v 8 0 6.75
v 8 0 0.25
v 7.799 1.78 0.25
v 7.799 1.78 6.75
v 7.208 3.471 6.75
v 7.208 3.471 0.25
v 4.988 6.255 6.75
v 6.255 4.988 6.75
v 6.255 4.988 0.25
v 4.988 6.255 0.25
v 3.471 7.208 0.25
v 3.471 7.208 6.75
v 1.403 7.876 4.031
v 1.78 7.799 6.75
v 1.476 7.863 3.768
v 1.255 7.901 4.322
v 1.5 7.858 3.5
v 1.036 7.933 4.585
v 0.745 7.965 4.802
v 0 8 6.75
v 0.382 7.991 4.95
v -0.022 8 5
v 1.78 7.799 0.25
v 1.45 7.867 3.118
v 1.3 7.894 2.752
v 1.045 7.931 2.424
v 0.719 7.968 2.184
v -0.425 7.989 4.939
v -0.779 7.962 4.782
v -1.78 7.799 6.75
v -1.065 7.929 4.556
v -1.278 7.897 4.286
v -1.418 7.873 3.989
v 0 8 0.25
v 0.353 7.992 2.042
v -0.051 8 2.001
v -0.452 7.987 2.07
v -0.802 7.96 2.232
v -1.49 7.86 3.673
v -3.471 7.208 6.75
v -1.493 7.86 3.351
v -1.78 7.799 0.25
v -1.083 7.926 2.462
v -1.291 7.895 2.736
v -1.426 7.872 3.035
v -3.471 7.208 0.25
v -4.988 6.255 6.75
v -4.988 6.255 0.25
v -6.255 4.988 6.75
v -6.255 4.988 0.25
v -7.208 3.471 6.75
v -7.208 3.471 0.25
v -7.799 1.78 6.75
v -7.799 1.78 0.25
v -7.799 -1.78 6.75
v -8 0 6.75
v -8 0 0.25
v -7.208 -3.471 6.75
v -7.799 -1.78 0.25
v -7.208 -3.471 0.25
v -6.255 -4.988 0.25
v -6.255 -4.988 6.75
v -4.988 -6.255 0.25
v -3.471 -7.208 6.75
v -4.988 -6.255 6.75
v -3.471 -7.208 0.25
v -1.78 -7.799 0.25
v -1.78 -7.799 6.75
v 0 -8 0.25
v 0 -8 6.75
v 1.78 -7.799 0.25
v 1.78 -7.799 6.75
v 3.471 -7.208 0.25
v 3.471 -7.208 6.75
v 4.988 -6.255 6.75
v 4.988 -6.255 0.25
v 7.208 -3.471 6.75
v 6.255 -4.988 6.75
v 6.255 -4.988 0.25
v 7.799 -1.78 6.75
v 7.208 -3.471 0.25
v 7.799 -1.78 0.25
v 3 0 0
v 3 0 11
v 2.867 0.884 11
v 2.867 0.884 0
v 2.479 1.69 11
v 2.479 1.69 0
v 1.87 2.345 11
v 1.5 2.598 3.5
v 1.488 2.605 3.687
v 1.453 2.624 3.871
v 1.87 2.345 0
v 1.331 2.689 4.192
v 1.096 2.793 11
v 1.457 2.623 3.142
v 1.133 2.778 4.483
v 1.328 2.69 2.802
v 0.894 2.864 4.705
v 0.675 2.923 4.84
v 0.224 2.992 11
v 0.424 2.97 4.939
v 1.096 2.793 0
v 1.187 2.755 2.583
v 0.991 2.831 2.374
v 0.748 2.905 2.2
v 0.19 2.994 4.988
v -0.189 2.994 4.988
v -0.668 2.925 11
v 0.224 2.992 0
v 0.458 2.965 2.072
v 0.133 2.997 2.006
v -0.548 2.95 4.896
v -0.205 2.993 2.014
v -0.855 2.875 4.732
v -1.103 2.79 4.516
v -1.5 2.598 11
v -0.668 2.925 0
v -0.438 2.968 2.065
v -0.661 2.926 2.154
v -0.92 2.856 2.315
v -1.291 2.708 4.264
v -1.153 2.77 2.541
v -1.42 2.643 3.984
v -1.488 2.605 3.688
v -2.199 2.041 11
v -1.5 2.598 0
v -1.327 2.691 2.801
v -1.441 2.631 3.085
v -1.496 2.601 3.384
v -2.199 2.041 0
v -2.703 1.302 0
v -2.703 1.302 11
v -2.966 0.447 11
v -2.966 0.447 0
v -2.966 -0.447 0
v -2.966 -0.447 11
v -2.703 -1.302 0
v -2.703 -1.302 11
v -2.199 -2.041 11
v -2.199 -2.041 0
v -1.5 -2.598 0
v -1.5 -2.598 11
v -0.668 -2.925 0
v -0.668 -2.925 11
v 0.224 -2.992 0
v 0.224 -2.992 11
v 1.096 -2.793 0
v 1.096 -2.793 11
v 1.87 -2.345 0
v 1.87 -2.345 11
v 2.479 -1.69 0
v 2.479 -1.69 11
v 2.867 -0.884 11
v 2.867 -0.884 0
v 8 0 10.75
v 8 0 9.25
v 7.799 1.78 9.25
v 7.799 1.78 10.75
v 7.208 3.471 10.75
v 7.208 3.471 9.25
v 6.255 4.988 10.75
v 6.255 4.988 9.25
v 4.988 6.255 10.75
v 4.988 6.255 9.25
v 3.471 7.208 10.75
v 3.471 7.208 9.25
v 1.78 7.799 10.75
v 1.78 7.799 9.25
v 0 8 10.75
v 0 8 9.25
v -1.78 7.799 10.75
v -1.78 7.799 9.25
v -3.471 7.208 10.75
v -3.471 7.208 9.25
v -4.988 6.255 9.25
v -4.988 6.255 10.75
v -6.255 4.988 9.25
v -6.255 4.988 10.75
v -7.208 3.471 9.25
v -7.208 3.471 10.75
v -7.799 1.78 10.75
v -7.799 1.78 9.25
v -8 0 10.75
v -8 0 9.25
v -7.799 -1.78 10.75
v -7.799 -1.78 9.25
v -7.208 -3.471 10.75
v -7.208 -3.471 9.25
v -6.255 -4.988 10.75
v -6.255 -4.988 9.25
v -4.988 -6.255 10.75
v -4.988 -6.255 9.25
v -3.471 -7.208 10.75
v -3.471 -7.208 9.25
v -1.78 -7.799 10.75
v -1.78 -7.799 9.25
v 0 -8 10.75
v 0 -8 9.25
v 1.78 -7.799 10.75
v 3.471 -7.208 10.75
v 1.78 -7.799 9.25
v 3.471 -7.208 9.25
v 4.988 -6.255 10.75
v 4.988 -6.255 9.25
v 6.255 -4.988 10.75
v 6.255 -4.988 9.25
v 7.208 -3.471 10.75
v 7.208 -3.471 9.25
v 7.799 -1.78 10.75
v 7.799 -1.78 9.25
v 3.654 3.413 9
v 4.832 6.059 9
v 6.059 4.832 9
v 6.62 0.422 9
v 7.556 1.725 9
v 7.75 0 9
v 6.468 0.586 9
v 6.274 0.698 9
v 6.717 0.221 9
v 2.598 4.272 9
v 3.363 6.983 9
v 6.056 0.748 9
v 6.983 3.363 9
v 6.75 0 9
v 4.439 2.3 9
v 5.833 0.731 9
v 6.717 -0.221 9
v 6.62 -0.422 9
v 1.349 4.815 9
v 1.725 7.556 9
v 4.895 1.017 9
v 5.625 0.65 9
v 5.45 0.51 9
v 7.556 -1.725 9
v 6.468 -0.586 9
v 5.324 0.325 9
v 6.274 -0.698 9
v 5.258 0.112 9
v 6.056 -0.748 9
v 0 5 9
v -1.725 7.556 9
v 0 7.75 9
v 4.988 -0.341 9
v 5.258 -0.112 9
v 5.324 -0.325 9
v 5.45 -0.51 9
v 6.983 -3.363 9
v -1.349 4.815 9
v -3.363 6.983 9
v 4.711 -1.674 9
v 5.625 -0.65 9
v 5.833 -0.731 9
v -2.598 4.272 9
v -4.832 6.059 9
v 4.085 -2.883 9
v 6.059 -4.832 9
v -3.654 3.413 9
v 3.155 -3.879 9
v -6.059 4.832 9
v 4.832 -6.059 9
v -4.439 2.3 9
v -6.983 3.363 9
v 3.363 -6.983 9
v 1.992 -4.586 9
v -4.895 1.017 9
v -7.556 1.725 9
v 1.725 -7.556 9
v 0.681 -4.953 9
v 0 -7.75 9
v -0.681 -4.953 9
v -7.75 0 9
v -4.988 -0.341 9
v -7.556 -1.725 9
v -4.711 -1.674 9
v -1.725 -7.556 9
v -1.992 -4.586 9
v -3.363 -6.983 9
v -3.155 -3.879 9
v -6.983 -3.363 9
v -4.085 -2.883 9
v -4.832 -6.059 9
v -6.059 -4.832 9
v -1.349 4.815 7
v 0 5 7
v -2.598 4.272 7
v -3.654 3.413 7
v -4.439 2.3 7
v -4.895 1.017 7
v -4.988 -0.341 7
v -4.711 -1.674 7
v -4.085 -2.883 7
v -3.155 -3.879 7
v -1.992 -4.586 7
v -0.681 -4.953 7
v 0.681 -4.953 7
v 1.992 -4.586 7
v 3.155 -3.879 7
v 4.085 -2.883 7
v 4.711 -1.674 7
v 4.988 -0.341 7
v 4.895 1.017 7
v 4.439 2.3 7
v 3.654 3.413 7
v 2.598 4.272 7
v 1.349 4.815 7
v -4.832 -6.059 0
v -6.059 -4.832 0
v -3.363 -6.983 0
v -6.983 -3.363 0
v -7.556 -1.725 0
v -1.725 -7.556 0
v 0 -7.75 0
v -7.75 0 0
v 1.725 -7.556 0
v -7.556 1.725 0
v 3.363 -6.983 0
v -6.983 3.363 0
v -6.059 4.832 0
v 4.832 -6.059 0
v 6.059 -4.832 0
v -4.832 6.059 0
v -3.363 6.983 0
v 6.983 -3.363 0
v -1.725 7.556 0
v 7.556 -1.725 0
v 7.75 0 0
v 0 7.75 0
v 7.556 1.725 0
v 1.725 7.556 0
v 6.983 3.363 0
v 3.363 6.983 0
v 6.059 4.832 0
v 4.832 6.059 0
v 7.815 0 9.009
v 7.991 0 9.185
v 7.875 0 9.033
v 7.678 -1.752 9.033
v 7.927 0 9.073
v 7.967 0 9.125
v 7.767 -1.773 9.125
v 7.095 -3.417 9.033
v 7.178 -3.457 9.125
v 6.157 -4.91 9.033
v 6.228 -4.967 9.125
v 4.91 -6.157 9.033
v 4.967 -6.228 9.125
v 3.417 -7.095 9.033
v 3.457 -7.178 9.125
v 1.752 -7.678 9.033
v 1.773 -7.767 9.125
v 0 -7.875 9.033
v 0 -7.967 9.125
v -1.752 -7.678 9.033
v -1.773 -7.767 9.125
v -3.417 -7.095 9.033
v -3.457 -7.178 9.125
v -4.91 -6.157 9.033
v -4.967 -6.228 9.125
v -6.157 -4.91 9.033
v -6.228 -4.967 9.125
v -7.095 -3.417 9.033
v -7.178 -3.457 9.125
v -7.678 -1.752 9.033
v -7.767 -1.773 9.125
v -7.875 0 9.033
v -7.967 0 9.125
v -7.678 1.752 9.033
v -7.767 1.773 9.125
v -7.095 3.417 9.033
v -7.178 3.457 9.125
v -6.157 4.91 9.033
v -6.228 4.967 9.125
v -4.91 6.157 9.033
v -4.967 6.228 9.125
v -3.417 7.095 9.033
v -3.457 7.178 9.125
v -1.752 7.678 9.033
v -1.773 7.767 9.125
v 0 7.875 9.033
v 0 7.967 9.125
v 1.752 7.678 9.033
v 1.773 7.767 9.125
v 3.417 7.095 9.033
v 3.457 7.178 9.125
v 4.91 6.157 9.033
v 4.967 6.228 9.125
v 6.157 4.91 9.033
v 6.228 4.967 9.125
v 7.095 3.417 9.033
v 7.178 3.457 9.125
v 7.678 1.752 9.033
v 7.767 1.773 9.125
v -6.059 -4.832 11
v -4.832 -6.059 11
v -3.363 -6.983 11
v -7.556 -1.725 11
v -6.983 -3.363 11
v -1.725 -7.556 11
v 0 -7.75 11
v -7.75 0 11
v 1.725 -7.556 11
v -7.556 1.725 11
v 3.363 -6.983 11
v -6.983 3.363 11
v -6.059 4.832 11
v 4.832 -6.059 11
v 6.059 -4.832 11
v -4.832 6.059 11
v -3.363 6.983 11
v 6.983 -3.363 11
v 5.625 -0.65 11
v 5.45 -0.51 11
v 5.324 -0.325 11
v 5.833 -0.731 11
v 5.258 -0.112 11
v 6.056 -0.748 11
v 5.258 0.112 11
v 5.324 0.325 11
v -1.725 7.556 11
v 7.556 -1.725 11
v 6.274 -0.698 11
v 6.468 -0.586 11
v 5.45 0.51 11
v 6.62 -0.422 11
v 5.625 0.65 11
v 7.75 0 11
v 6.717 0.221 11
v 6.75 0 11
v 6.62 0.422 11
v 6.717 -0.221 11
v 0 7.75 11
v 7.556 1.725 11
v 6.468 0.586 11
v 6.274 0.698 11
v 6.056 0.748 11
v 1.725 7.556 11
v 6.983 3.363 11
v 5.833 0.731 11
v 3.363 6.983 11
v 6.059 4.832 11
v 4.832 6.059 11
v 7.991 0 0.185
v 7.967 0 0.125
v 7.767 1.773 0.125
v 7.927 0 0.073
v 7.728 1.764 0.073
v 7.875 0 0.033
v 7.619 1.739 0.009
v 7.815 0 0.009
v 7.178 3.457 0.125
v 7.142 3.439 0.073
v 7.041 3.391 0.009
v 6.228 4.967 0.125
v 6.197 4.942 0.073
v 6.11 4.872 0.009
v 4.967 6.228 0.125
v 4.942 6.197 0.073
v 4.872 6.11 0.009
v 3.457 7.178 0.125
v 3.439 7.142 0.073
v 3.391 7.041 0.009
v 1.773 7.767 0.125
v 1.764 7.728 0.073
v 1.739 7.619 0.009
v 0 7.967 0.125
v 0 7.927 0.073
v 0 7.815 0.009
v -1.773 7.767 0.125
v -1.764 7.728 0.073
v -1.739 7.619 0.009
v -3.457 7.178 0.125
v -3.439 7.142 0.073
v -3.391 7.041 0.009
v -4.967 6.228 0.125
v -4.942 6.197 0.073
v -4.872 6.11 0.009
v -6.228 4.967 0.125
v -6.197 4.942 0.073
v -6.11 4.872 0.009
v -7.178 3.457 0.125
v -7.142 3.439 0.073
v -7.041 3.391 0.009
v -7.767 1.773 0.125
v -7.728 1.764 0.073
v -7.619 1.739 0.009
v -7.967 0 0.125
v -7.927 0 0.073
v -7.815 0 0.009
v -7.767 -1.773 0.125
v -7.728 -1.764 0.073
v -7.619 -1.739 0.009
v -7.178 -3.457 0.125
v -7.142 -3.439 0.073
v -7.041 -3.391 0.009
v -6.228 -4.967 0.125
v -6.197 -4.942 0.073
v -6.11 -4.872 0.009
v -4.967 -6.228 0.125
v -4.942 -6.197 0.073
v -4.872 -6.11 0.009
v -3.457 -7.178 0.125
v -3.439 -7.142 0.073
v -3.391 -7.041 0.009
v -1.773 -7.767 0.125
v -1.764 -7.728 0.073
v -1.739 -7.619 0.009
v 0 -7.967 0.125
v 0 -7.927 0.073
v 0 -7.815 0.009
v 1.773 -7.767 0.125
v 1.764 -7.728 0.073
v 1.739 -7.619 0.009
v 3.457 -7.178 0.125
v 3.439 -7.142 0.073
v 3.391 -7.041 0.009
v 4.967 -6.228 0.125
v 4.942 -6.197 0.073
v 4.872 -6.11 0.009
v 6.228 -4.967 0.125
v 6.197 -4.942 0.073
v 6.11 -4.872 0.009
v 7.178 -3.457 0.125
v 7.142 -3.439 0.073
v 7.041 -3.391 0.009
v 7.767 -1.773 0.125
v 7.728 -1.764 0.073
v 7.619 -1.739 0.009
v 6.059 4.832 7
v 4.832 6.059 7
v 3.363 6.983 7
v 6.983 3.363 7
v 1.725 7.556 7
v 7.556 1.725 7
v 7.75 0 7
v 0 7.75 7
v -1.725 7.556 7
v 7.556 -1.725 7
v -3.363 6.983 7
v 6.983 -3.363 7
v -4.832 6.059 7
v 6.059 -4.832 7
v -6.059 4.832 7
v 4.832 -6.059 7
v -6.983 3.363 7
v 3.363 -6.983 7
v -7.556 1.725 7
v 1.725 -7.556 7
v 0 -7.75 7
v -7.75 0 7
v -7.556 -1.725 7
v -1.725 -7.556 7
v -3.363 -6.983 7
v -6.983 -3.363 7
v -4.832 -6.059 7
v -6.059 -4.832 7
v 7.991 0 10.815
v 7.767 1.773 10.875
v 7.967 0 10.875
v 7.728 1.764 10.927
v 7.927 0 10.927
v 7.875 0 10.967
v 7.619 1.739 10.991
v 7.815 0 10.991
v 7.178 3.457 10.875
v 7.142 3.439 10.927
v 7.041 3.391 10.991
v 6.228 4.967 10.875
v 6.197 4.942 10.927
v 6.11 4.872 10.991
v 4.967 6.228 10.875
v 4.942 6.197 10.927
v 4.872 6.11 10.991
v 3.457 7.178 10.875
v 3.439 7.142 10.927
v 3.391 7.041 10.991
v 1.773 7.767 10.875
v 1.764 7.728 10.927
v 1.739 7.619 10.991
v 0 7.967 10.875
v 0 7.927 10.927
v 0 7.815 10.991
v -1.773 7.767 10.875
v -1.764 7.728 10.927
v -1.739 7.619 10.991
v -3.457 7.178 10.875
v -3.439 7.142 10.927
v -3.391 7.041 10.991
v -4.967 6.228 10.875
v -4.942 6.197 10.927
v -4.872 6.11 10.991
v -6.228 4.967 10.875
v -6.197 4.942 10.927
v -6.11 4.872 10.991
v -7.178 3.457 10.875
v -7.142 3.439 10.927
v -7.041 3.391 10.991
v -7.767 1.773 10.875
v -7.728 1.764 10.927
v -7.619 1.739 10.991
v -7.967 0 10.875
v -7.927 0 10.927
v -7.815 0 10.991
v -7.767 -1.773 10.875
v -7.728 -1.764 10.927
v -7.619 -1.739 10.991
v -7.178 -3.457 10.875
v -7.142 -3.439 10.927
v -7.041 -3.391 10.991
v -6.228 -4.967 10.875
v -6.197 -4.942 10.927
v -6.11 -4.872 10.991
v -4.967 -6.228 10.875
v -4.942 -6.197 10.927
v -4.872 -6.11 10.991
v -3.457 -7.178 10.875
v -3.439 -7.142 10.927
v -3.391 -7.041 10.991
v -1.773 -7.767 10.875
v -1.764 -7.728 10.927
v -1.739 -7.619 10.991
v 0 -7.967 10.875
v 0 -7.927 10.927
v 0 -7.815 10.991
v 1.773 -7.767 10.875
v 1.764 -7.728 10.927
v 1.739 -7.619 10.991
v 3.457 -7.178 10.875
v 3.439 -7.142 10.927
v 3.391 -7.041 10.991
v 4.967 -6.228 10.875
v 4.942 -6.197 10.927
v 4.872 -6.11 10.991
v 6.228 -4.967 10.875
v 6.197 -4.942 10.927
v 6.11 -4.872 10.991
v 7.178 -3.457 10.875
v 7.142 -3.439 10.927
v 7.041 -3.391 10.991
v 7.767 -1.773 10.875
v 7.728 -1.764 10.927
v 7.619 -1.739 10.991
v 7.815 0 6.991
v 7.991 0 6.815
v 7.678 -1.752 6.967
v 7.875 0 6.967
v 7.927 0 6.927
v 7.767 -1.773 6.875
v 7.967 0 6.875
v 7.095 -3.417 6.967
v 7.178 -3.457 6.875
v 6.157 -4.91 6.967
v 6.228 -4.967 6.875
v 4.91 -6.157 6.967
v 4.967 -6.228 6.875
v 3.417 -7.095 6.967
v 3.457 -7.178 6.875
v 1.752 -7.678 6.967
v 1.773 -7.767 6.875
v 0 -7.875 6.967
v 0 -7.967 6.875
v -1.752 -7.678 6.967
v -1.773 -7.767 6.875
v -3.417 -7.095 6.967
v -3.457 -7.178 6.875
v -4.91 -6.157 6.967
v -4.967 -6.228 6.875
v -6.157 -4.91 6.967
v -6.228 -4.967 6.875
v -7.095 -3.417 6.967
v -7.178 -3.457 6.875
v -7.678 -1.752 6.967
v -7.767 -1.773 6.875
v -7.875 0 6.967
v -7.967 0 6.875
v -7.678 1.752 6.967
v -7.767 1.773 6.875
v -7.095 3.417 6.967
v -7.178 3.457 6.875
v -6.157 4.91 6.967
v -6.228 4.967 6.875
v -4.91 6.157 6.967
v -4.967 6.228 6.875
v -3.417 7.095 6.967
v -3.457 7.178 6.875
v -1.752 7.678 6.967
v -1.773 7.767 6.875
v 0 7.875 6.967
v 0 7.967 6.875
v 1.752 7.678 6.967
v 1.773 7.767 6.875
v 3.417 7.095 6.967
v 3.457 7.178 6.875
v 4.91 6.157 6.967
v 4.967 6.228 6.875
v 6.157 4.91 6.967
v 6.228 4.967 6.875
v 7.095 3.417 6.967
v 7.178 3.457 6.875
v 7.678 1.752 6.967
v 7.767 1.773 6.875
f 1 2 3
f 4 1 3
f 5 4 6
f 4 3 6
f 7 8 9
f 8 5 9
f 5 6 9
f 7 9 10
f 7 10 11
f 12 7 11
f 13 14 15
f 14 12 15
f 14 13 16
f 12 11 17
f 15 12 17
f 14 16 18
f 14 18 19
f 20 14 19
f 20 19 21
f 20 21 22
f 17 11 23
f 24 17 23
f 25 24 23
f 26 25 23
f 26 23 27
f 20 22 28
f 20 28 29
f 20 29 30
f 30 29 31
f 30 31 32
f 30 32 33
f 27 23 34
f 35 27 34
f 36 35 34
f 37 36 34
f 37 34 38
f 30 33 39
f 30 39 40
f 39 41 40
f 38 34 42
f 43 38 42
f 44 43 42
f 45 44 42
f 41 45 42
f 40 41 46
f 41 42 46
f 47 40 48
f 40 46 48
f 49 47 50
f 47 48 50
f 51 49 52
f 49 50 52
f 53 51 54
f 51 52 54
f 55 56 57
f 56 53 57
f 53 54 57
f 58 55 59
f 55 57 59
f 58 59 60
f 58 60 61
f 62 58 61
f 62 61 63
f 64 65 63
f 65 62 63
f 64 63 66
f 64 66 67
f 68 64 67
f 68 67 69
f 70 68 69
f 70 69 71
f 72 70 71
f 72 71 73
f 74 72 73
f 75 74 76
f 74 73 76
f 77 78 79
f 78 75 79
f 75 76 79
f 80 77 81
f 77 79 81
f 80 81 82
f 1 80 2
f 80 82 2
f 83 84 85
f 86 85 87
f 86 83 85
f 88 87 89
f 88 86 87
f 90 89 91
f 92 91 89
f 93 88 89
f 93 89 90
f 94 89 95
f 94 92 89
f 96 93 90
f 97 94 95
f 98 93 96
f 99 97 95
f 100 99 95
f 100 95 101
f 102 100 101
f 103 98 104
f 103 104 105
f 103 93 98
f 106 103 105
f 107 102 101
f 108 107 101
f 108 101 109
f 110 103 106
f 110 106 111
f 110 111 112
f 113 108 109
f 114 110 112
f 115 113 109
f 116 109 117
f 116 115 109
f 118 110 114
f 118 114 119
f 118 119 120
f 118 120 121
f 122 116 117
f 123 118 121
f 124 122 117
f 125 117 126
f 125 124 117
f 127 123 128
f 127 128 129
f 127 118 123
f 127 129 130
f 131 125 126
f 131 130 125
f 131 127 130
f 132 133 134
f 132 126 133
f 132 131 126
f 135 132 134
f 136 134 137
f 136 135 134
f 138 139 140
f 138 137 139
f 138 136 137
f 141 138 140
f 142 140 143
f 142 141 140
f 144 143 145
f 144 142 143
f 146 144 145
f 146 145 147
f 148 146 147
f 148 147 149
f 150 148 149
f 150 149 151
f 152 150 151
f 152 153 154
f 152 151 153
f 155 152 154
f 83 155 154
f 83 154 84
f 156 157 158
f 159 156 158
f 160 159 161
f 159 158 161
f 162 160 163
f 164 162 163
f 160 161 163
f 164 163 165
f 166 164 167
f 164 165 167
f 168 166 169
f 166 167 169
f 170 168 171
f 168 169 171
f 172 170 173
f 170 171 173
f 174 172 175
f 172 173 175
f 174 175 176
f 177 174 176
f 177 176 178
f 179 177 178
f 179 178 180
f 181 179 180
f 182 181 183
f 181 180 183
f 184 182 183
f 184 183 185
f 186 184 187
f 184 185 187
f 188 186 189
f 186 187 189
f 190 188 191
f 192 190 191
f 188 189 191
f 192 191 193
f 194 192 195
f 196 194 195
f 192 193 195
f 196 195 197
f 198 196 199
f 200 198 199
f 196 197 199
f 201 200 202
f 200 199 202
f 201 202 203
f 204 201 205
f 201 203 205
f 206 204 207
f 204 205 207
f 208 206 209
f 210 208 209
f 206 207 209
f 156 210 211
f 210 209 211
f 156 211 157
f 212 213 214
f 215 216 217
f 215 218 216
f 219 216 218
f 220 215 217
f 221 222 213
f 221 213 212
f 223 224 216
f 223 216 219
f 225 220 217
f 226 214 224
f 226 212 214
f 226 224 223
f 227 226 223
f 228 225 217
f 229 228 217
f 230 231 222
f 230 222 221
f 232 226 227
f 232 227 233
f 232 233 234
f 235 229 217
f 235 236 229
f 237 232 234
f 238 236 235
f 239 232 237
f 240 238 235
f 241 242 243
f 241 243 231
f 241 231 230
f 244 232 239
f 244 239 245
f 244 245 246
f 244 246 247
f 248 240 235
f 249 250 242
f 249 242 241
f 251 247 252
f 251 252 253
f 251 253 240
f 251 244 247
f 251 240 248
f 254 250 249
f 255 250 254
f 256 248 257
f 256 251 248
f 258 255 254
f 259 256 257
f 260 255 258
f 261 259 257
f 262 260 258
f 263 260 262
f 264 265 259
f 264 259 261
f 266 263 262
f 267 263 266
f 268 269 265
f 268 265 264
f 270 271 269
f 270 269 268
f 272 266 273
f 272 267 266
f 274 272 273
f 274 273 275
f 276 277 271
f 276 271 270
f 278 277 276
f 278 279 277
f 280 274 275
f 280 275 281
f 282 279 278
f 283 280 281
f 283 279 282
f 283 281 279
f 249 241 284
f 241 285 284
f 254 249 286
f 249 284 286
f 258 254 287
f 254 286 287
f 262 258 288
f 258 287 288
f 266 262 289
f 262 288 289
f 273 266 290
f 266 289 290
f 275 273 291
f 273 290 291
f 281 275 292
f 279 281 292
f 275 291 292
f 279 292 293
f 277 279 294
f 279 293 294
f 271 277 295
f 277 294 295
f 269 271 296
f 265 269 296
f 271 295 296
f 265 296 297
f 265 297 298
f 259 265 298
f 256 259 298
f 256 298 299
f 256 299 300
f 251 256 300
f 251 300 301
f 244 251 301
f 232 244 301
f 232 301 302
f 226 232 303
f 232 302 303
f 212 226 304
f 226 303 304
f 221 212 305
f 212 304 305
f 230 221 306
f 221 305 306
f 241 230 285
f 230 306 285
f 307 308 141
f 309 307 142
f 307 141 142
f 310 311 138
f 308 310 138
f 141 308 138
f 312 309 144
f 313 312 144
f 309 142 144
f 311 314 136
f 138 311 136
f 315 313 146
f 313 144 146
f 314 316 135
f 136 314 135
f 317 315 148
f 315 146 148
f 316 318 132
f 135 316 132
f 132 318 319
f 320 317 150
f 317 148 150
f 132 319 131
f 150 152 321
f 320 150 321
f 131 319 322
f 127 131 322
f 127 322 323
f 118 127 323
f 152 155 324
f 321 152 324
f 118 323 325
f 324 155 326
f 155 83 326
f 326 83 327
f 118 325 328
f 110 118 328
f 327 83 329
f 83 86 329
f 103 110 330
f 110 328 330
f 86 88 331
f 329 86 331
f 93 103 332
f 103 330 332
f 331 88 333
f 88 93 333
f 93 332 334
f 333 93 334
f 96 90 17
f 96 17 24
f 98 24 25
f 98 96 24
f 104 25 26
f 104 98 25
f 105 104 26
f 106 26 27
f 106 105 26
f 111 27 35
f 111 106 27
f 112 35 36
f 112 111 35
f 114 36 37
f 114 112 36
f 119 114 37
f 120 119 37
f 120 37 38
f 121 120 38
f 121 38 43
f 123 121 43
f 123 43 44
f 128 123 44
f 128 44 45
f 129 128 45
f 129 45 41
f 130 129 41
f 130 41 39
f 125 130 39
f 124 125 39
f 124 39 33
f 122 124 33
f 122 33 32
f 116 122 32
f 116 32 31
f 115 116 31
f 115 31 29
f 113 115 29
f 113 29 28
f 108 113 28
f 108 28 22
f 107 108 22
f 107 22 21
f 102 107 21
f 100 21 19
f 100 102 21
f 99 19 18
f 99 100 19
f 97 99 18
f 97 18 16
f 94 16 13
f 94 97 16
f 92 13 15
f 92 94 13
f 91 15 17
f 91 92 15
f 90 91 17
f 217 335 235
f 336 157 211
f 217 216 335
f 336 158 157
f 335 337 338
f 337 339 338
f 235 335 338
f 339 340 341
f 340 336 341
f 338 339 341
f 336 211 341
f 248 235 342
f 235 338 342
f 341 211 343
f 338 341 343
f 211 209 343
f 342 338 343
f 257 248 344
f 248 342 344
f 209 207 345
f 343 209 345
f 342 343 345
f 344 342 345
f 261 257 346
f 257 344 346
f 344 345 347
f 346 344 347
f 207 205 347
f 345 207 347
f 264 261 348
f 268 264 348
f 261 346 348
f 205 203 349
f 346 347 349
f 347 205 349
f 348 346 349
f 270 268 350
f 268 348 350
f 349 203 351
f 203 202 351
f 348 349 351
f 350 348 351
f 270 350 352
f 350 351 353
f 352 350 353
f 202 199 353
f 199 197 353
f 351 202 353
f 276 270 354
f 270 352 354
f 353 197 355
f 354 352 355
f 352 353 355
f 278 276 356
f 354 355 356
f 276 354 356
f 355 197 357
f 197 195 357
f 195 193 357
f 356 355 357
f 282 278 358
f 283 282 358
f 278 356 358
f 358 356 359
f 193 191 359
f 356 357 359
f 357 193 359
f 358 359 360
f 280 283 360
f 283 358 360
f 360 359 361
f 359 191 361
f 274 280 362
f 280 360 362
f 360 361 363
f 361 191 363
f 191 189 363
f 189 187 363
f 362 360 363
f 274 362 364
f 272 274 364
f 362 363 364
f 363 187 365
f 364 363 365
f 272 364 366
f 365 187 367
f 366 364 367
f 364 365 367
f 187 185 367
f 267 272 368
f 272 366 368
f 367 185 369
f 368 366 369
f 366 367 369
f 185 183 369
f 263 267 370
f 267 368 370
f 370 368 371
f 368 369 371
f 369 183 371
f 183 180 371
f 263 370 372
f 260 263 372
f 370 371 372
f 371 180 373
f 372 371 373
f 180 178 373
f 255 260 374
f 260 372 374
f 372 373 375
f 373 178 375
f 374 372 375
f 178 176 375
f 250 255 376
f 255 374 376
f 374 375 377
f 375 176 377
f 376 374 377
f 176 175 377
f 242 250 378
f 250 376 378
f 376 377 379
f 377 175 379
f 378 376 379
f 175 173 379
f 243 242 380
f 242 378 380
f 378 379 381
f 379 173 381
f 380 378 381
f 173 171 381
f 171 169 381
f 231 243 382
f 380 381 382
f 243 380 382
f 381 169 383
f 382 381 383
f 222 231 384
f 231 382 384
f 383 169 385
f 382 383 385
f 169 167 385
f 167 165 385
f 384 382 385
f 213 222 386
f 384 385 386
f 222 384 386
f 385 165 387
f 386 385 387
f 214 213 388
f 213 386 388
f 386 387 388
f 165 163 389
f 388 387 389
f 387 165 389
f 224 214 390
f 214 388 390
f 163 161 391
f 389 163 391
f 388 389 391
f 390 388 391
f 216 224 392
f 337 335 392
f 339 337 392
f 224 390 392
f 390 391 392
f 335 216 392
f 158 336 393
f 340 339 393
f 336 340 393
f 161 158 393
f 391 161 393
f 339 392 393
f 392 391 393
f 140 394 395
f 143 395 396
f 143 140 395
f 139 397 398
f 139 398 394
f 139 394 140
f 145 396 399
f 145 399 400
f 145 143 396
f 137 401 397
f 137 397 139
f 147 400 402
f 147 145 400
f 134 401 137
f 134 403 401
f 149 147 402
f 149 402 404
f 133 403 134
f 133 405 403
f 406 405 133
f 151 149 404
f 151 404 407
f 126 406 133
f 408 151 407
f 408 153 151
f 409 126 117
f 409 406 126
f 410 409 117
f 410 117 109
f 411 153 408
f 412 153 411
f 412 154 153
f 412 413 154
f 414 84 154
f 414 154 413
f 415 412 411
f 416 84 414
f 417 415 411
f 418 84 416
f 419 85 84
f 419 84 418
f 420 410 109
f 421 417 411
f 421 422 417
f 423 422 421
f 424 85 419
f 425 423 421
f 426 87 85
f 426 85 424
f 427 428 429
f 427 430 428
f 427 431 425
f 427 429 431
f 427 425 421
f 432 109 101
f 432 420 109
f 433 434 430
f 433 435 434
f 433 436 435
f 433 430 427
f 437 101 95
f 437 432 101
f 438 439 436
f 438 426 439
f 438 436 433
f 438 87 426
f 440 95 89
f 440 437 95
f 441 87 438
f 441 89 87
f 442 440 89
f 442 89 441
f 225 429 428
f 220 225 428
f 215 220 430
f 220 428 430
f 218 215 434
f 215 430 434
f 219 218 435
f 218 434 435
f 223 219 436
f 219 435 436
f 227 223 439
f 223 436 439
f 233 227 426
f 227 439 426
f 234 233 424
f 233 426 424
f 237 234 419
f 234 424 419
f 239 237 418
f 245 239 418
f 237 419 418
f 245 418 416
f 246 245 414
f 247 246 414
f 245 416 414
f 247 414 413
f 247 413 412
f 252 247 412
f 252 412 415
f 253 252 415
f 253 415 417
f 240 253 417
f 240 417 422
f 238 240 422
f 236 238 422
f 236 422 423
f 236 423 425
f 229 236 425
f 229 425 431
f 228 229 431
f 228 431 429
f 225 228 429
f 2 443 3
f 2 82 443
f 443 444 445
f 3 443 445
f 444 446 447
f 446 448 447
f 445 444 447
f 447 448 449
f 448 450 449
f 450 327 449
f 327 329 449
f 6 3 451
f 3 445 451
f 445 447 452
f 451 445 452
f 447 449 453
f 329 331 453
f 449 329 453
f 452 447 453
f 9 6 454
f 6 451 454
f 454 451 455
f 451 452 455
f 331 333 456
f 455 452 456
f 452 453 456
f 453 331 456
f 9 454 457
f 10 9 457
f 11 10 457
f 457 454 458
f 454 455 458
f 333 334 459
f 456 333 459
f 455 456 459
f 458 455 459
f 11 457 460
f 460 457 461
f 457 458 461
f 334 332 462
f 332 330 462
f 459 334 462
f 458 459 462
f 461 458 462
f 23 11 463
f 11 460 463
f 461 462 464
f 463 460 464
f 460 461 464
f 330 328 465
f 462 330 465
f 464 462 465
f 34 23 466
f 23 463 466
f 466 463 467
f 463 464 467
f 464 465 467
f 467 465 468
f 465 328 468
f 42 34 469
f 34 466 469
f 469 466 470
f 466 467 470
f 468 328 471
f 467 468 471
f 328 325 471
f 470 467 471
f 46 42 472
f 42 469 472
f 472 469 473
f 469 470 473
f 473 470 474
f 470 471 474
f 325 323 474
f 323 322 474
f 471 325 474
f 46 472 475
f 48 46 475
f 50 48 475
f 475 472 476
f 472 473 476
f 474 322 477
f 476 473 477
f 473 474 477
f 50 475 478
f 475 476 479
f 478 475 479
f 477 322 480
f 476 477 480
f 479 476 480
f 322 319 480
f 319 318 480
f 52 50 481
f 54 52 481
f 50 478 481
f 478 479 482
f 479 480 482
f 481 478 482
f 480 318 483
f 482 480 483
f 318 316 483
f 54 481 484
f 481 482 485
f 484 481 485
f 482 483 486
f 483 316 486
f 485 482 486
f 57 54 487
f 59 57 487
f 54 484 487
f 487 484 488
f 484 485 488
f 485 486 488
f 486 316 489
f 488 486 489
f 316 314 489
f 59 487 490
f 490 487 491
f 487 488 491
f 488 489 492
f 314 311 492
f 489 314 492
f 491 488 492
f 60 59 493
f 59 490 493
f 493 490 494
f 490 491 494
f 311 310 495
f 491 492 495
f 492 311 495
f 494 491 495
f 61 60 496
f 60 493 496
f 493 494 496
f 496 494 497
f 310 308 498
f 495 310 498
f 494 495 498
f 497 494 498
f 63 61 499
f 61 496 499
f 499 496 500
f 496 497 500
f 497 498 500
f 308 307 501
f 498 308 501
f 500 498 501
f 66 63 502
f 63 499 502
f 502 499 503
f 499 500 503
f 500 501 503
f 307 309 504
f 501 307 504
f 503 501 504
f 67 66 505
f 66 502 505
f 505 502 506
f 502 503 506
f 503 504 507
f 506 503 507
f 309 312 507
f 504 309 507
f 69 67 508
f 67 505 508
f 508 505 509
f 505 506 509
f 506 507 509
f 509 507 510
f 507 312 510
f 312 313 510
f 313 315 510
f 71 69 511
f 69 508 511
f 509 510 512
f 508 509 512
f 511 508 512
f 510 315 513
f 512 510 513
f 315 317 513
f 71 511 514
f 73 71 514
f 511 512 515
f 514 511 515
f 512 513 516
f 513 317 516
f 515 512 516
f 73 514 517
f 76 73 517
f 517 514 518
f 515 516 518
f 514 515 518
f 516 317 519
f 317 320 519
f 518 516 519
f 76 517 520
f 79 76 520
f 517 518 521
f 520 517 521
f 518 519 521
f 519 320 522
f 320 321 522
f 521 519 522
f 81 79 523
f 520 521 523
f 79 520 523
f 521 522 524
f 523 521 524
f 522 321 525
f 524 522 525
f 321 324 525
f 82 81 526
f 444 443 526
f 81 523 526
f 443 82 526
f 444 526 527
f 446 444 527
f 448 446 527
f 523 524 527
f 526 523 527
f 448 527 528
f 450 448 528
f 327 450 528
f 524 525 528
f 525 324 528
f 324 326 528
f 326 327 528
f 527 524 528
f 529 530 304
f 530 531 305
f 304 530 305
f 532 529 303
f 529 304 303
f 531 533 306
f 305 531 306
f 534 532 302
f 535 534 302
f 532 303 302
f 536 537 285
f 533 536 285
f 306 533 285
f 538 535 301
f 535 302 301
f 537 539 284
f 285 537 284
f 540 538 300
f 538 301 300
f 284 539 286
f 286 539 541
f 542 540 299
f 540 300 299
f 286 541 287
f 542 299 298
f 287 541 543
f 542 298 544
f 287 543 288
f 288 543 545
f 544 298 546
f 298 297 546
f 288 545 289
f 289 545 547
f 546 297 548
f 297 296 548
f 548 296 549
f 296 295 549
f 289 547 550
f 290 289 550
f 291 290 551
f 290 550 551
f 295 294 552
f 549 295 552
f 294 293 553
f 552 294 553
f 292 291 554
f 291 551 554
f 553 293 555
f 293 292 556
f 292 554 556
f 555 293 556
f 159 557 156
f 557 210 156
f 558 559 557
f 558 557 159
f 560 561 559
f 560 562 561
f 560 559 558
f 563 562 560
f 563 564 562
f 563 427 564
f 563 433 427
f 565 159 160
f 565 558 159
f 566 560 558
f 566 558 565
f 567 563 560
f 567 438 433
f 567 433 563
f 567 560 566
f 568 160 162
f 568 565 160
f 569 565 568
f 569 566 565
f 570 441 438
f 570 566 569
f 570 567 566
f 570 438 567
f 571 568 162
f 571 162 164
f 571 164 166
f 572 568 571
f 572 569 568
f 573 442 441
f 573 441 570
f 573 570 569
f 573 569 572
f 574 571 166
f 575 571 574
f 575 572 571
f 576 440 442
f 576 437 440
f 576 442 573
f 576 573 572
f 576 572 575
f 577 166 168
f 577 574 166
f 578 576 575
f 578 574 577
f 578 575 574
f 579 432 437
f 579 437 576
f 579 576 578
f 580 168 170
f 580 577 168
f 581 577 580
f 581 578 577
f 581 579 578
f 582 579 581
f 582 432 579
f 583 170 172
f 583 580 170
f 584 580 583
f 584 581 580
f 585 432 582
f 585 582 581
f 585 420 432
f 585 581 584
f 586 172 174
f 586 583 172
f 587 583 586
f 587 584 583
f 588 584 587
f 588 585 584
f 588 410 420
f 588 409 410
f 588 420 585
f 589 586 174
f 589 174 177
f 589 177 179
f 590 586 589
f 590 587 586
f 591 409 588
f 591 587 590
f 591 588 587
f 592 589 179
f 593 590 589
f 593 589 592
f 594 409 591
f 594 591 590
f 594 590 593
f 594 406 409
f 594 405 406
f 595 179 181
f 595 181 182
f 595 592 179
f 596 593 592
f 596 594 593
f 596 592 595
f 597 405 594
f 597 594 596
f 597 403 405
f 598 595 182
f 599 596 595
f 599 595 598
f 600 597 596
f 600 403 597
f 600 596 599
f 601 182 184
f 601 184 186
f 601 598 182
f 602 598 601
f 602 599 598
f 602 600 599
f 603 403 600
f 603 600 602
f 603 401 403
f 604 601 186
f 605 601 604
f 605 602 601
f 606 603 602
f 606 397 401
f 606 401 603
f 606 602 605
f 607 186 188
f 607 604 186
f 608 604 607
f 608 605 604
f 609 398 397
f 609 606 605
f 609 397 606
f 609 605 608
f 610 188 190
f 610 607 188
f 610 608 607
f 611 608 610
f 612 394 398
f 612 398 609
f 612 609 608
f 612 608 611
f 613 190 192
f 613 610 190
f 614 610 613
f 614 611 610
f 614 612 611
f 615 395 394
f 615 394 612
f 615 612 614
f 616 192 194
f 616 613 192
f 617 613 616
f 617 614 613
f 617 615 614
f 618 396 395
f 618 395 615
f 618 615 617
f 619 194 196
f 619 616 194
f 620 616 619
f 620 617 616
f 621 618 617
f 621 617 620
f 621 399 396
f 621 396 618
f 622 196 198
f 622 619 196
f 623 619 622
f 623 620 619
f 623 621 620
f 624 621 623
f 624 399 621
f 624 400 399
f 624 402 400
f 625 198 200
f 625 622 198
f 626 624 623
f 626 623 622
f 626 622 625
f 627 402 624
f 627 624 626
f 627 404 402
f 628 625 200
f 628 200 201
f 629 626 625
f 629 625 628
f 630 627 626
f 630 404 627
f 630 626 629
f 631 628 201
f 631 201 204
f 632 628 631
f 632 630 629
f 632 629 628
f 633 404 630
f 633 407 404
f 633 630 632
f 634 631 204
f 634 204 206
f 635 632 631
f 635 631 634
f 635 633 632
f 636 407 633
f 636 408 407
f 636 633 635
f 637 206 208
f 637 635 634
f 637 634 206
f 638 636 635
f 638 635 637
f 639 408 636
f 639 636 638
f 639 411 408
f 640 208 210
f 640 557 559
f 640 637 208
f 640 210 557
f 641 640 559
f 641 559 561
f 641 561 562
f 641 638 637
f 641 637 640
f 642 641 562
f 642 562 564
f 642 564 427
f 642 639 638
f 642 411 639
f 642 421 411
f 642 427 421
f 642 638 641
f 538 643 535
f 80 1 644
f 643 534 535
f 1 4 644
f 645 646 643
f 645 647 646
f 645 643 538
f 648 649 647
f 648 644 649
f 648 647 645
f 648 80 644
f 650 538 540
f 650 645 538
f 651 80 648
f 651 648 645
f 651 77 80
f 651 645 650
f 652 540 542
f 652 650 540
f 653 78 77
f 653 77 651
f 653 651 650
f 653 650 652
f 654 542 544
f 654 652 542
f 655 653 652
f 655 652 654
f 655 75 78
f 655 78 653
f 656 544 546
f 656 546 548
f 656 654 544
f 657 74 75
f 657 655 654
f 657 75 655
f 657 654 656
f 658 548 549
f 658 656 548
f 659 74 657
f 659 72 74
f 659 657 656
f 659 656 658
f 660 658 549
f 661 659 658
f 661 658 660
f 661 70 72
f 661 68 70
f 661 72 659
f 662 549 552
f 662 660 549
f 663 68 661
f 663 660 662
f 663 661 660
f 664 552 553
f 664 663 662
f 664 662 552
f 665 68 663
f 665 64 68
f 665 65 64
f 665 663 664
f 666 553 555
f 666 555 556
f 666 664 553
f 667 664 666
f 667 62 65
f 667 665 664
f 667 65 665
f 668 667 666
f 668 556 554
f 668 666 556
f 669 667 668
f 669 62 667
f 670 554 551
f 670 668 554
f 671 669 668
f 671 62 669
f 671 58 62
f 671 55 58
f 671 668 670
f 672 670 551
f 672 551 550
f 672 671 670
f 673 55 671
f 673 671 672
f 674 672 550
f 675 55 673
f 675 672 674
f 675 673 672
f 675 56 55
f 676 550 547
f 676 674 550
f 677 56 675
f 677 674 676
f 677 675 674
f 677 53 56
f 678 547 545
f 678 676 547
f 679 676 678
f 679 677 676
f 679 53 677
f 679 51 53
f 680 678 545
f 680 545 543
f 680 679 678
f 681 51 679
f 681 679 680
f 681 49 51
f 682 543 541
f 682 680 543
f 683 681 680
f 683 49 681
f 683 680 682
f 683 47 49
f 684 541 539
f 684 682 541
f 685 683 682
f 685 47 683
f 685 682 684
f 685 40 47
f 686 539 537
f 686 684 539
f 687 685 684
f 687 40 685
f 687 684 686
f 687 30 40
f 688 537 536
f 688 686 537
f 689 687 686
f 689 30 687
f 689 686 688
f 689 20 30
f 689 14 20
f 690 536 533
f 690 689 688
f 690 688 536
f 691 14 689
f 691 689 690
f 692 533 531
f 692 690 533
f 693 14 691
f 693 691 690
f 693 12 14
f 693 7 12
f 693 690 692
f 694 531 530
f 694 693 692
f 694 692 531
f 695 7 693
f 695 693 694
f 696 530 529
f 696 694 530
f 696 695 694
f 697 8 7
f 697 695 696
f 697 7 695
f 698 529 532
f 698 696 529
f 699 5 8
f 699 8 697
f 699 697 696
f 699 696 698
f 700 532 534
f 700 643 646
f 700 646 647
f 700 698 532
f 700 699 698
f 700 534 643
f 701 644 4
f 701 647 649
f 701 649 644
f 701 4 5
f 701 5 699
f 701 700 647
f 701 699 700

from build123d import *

# Parameters (mm, degrees)
SKETCH1_R           = 8
BOSS_EXTRUDE1_DEPTH = 11
SKETCH2_W           = 2
SKETCH2_H           = 3
CUT_EXTRUDE1_REACH  = 12.5
CUT_EXTRUDE1_START  = 2.5
SKETCH5_R           = 1.5
CUT_EXTRUDE2_REACH  = 13
SKETCH6_R           = 3
FILLET3_R           = 0.25
FILLET4_R           = 0.25
FILLET5_R           = 0.25
CUT_EXTRUDE3_REACH  = 13
SKETCH7_R           = 0.75


with BuildPart() as part:
    # Sketch1 → Boss-Extrude1 (new body)
    with BuildSketch(Plane.XY):
        Circle(SKETCH1_R)
    extrude(amount=BOSS_EXTRUDE1_DEPTH)

    # Sketch2 → Cut-Revolve2 (revolve, cut)
    with BuildSketch(Plane(origin=(0, 0, 0), x_dir=(0, 0, -1), z_dir=(1, 0, 0))):
        with Locations((-8, 6.5)):
            Rectangle(SKETCH2_W, SKETCH2_H)
    revolve(axis=Axis((0, 0, -5.249485175), (0, 0, 1)), mode=Mode.SUBTRACT)

    # Sketch5 → Cut-Extrude1 (cut, up to next)
    with BuildSketch(Plane(origin=(0, 0, 0), x_dir=(1, 0, 0), z_dir=(0, 1, 0)).offset(CUT_EXTRUDE1_START), mode=Mode.PRIVATE) as cut_extrude1_sk1:
        with Locations((0, -3.5)):
            Circle(SKETCH5_R)
    cut_extrude1_tool1 = extrude(cut_extrude1_sk1.sketch, amount=CUT_EXTRUDE1_REACH, mode=Mode.PRIVATE) & part.part
    add(cut_extrude1_tool1.solids().sort_by_distance((0, 2.5, 3.5))[0], mode=Mode.SUBTRACT)

    # Sketch6 → Cut-Extrude2 (cut, up to next)
    with BuildSketch(Plane.XY, mode=Mode.PRIVATE) as cut_extrude2_sk1:
        Circle(SKETCH6_R)
    cut_extrude2_tool1 = extrude(cut_extrude2_sk1.sketch, amount=CUT_EXTRUDE2_REACH, mode=Mode.PRIVATE) & part.part
    add(cut_extrude2_tool1.solids().sort_by_distance((0, 0, 0))[0], mode=Mode.SUBTRACT)

    # Fillet3
    fillet3_edges = [part.edges().sort_by_distance(p)[0] for p in [
        (-8, 0, 9),
    ]]
    fillet(fillet3_edges, radius=FILLET3_R)

    # Fillet4
    fillet4_edges = [part.edges().sort_by_distance(p)[0] for p in [
        (-8, 0, 7),
    ]]
    fillet(fillet4_edges, radius=FILLET4_R)

    # Fillet5
    fillet5_edges = [part.edges().sort_by_distance(p)[0] for p in [
        (-8, 0, 0),
        (-8, 0, 11),
    ]]
    fillet(fillet5_edges, radius=FILLET5_R)

    # Sketch7 → Cut-Extrude3 (cut, up to next)
    with BuildSketch(Plane.XY.offset(11), mode=Mode.PRIVATE) as cut_extrude3_sk1:
        with Locations((6, 0)):
            Circle(SKETCH7_R)
    cut_extrude3_tool1 = extrude(cut_extrude3_sk1.sketch, amount=-CUT_EXTRUDE3_REACH, mode=Mode.PRIVATE) & part.part
    add(cut_extrude3_tool1.solids().sort_by_distance((6, 0, 11))[0], mode=Mode.SUBTRACT)


solid = part.part
